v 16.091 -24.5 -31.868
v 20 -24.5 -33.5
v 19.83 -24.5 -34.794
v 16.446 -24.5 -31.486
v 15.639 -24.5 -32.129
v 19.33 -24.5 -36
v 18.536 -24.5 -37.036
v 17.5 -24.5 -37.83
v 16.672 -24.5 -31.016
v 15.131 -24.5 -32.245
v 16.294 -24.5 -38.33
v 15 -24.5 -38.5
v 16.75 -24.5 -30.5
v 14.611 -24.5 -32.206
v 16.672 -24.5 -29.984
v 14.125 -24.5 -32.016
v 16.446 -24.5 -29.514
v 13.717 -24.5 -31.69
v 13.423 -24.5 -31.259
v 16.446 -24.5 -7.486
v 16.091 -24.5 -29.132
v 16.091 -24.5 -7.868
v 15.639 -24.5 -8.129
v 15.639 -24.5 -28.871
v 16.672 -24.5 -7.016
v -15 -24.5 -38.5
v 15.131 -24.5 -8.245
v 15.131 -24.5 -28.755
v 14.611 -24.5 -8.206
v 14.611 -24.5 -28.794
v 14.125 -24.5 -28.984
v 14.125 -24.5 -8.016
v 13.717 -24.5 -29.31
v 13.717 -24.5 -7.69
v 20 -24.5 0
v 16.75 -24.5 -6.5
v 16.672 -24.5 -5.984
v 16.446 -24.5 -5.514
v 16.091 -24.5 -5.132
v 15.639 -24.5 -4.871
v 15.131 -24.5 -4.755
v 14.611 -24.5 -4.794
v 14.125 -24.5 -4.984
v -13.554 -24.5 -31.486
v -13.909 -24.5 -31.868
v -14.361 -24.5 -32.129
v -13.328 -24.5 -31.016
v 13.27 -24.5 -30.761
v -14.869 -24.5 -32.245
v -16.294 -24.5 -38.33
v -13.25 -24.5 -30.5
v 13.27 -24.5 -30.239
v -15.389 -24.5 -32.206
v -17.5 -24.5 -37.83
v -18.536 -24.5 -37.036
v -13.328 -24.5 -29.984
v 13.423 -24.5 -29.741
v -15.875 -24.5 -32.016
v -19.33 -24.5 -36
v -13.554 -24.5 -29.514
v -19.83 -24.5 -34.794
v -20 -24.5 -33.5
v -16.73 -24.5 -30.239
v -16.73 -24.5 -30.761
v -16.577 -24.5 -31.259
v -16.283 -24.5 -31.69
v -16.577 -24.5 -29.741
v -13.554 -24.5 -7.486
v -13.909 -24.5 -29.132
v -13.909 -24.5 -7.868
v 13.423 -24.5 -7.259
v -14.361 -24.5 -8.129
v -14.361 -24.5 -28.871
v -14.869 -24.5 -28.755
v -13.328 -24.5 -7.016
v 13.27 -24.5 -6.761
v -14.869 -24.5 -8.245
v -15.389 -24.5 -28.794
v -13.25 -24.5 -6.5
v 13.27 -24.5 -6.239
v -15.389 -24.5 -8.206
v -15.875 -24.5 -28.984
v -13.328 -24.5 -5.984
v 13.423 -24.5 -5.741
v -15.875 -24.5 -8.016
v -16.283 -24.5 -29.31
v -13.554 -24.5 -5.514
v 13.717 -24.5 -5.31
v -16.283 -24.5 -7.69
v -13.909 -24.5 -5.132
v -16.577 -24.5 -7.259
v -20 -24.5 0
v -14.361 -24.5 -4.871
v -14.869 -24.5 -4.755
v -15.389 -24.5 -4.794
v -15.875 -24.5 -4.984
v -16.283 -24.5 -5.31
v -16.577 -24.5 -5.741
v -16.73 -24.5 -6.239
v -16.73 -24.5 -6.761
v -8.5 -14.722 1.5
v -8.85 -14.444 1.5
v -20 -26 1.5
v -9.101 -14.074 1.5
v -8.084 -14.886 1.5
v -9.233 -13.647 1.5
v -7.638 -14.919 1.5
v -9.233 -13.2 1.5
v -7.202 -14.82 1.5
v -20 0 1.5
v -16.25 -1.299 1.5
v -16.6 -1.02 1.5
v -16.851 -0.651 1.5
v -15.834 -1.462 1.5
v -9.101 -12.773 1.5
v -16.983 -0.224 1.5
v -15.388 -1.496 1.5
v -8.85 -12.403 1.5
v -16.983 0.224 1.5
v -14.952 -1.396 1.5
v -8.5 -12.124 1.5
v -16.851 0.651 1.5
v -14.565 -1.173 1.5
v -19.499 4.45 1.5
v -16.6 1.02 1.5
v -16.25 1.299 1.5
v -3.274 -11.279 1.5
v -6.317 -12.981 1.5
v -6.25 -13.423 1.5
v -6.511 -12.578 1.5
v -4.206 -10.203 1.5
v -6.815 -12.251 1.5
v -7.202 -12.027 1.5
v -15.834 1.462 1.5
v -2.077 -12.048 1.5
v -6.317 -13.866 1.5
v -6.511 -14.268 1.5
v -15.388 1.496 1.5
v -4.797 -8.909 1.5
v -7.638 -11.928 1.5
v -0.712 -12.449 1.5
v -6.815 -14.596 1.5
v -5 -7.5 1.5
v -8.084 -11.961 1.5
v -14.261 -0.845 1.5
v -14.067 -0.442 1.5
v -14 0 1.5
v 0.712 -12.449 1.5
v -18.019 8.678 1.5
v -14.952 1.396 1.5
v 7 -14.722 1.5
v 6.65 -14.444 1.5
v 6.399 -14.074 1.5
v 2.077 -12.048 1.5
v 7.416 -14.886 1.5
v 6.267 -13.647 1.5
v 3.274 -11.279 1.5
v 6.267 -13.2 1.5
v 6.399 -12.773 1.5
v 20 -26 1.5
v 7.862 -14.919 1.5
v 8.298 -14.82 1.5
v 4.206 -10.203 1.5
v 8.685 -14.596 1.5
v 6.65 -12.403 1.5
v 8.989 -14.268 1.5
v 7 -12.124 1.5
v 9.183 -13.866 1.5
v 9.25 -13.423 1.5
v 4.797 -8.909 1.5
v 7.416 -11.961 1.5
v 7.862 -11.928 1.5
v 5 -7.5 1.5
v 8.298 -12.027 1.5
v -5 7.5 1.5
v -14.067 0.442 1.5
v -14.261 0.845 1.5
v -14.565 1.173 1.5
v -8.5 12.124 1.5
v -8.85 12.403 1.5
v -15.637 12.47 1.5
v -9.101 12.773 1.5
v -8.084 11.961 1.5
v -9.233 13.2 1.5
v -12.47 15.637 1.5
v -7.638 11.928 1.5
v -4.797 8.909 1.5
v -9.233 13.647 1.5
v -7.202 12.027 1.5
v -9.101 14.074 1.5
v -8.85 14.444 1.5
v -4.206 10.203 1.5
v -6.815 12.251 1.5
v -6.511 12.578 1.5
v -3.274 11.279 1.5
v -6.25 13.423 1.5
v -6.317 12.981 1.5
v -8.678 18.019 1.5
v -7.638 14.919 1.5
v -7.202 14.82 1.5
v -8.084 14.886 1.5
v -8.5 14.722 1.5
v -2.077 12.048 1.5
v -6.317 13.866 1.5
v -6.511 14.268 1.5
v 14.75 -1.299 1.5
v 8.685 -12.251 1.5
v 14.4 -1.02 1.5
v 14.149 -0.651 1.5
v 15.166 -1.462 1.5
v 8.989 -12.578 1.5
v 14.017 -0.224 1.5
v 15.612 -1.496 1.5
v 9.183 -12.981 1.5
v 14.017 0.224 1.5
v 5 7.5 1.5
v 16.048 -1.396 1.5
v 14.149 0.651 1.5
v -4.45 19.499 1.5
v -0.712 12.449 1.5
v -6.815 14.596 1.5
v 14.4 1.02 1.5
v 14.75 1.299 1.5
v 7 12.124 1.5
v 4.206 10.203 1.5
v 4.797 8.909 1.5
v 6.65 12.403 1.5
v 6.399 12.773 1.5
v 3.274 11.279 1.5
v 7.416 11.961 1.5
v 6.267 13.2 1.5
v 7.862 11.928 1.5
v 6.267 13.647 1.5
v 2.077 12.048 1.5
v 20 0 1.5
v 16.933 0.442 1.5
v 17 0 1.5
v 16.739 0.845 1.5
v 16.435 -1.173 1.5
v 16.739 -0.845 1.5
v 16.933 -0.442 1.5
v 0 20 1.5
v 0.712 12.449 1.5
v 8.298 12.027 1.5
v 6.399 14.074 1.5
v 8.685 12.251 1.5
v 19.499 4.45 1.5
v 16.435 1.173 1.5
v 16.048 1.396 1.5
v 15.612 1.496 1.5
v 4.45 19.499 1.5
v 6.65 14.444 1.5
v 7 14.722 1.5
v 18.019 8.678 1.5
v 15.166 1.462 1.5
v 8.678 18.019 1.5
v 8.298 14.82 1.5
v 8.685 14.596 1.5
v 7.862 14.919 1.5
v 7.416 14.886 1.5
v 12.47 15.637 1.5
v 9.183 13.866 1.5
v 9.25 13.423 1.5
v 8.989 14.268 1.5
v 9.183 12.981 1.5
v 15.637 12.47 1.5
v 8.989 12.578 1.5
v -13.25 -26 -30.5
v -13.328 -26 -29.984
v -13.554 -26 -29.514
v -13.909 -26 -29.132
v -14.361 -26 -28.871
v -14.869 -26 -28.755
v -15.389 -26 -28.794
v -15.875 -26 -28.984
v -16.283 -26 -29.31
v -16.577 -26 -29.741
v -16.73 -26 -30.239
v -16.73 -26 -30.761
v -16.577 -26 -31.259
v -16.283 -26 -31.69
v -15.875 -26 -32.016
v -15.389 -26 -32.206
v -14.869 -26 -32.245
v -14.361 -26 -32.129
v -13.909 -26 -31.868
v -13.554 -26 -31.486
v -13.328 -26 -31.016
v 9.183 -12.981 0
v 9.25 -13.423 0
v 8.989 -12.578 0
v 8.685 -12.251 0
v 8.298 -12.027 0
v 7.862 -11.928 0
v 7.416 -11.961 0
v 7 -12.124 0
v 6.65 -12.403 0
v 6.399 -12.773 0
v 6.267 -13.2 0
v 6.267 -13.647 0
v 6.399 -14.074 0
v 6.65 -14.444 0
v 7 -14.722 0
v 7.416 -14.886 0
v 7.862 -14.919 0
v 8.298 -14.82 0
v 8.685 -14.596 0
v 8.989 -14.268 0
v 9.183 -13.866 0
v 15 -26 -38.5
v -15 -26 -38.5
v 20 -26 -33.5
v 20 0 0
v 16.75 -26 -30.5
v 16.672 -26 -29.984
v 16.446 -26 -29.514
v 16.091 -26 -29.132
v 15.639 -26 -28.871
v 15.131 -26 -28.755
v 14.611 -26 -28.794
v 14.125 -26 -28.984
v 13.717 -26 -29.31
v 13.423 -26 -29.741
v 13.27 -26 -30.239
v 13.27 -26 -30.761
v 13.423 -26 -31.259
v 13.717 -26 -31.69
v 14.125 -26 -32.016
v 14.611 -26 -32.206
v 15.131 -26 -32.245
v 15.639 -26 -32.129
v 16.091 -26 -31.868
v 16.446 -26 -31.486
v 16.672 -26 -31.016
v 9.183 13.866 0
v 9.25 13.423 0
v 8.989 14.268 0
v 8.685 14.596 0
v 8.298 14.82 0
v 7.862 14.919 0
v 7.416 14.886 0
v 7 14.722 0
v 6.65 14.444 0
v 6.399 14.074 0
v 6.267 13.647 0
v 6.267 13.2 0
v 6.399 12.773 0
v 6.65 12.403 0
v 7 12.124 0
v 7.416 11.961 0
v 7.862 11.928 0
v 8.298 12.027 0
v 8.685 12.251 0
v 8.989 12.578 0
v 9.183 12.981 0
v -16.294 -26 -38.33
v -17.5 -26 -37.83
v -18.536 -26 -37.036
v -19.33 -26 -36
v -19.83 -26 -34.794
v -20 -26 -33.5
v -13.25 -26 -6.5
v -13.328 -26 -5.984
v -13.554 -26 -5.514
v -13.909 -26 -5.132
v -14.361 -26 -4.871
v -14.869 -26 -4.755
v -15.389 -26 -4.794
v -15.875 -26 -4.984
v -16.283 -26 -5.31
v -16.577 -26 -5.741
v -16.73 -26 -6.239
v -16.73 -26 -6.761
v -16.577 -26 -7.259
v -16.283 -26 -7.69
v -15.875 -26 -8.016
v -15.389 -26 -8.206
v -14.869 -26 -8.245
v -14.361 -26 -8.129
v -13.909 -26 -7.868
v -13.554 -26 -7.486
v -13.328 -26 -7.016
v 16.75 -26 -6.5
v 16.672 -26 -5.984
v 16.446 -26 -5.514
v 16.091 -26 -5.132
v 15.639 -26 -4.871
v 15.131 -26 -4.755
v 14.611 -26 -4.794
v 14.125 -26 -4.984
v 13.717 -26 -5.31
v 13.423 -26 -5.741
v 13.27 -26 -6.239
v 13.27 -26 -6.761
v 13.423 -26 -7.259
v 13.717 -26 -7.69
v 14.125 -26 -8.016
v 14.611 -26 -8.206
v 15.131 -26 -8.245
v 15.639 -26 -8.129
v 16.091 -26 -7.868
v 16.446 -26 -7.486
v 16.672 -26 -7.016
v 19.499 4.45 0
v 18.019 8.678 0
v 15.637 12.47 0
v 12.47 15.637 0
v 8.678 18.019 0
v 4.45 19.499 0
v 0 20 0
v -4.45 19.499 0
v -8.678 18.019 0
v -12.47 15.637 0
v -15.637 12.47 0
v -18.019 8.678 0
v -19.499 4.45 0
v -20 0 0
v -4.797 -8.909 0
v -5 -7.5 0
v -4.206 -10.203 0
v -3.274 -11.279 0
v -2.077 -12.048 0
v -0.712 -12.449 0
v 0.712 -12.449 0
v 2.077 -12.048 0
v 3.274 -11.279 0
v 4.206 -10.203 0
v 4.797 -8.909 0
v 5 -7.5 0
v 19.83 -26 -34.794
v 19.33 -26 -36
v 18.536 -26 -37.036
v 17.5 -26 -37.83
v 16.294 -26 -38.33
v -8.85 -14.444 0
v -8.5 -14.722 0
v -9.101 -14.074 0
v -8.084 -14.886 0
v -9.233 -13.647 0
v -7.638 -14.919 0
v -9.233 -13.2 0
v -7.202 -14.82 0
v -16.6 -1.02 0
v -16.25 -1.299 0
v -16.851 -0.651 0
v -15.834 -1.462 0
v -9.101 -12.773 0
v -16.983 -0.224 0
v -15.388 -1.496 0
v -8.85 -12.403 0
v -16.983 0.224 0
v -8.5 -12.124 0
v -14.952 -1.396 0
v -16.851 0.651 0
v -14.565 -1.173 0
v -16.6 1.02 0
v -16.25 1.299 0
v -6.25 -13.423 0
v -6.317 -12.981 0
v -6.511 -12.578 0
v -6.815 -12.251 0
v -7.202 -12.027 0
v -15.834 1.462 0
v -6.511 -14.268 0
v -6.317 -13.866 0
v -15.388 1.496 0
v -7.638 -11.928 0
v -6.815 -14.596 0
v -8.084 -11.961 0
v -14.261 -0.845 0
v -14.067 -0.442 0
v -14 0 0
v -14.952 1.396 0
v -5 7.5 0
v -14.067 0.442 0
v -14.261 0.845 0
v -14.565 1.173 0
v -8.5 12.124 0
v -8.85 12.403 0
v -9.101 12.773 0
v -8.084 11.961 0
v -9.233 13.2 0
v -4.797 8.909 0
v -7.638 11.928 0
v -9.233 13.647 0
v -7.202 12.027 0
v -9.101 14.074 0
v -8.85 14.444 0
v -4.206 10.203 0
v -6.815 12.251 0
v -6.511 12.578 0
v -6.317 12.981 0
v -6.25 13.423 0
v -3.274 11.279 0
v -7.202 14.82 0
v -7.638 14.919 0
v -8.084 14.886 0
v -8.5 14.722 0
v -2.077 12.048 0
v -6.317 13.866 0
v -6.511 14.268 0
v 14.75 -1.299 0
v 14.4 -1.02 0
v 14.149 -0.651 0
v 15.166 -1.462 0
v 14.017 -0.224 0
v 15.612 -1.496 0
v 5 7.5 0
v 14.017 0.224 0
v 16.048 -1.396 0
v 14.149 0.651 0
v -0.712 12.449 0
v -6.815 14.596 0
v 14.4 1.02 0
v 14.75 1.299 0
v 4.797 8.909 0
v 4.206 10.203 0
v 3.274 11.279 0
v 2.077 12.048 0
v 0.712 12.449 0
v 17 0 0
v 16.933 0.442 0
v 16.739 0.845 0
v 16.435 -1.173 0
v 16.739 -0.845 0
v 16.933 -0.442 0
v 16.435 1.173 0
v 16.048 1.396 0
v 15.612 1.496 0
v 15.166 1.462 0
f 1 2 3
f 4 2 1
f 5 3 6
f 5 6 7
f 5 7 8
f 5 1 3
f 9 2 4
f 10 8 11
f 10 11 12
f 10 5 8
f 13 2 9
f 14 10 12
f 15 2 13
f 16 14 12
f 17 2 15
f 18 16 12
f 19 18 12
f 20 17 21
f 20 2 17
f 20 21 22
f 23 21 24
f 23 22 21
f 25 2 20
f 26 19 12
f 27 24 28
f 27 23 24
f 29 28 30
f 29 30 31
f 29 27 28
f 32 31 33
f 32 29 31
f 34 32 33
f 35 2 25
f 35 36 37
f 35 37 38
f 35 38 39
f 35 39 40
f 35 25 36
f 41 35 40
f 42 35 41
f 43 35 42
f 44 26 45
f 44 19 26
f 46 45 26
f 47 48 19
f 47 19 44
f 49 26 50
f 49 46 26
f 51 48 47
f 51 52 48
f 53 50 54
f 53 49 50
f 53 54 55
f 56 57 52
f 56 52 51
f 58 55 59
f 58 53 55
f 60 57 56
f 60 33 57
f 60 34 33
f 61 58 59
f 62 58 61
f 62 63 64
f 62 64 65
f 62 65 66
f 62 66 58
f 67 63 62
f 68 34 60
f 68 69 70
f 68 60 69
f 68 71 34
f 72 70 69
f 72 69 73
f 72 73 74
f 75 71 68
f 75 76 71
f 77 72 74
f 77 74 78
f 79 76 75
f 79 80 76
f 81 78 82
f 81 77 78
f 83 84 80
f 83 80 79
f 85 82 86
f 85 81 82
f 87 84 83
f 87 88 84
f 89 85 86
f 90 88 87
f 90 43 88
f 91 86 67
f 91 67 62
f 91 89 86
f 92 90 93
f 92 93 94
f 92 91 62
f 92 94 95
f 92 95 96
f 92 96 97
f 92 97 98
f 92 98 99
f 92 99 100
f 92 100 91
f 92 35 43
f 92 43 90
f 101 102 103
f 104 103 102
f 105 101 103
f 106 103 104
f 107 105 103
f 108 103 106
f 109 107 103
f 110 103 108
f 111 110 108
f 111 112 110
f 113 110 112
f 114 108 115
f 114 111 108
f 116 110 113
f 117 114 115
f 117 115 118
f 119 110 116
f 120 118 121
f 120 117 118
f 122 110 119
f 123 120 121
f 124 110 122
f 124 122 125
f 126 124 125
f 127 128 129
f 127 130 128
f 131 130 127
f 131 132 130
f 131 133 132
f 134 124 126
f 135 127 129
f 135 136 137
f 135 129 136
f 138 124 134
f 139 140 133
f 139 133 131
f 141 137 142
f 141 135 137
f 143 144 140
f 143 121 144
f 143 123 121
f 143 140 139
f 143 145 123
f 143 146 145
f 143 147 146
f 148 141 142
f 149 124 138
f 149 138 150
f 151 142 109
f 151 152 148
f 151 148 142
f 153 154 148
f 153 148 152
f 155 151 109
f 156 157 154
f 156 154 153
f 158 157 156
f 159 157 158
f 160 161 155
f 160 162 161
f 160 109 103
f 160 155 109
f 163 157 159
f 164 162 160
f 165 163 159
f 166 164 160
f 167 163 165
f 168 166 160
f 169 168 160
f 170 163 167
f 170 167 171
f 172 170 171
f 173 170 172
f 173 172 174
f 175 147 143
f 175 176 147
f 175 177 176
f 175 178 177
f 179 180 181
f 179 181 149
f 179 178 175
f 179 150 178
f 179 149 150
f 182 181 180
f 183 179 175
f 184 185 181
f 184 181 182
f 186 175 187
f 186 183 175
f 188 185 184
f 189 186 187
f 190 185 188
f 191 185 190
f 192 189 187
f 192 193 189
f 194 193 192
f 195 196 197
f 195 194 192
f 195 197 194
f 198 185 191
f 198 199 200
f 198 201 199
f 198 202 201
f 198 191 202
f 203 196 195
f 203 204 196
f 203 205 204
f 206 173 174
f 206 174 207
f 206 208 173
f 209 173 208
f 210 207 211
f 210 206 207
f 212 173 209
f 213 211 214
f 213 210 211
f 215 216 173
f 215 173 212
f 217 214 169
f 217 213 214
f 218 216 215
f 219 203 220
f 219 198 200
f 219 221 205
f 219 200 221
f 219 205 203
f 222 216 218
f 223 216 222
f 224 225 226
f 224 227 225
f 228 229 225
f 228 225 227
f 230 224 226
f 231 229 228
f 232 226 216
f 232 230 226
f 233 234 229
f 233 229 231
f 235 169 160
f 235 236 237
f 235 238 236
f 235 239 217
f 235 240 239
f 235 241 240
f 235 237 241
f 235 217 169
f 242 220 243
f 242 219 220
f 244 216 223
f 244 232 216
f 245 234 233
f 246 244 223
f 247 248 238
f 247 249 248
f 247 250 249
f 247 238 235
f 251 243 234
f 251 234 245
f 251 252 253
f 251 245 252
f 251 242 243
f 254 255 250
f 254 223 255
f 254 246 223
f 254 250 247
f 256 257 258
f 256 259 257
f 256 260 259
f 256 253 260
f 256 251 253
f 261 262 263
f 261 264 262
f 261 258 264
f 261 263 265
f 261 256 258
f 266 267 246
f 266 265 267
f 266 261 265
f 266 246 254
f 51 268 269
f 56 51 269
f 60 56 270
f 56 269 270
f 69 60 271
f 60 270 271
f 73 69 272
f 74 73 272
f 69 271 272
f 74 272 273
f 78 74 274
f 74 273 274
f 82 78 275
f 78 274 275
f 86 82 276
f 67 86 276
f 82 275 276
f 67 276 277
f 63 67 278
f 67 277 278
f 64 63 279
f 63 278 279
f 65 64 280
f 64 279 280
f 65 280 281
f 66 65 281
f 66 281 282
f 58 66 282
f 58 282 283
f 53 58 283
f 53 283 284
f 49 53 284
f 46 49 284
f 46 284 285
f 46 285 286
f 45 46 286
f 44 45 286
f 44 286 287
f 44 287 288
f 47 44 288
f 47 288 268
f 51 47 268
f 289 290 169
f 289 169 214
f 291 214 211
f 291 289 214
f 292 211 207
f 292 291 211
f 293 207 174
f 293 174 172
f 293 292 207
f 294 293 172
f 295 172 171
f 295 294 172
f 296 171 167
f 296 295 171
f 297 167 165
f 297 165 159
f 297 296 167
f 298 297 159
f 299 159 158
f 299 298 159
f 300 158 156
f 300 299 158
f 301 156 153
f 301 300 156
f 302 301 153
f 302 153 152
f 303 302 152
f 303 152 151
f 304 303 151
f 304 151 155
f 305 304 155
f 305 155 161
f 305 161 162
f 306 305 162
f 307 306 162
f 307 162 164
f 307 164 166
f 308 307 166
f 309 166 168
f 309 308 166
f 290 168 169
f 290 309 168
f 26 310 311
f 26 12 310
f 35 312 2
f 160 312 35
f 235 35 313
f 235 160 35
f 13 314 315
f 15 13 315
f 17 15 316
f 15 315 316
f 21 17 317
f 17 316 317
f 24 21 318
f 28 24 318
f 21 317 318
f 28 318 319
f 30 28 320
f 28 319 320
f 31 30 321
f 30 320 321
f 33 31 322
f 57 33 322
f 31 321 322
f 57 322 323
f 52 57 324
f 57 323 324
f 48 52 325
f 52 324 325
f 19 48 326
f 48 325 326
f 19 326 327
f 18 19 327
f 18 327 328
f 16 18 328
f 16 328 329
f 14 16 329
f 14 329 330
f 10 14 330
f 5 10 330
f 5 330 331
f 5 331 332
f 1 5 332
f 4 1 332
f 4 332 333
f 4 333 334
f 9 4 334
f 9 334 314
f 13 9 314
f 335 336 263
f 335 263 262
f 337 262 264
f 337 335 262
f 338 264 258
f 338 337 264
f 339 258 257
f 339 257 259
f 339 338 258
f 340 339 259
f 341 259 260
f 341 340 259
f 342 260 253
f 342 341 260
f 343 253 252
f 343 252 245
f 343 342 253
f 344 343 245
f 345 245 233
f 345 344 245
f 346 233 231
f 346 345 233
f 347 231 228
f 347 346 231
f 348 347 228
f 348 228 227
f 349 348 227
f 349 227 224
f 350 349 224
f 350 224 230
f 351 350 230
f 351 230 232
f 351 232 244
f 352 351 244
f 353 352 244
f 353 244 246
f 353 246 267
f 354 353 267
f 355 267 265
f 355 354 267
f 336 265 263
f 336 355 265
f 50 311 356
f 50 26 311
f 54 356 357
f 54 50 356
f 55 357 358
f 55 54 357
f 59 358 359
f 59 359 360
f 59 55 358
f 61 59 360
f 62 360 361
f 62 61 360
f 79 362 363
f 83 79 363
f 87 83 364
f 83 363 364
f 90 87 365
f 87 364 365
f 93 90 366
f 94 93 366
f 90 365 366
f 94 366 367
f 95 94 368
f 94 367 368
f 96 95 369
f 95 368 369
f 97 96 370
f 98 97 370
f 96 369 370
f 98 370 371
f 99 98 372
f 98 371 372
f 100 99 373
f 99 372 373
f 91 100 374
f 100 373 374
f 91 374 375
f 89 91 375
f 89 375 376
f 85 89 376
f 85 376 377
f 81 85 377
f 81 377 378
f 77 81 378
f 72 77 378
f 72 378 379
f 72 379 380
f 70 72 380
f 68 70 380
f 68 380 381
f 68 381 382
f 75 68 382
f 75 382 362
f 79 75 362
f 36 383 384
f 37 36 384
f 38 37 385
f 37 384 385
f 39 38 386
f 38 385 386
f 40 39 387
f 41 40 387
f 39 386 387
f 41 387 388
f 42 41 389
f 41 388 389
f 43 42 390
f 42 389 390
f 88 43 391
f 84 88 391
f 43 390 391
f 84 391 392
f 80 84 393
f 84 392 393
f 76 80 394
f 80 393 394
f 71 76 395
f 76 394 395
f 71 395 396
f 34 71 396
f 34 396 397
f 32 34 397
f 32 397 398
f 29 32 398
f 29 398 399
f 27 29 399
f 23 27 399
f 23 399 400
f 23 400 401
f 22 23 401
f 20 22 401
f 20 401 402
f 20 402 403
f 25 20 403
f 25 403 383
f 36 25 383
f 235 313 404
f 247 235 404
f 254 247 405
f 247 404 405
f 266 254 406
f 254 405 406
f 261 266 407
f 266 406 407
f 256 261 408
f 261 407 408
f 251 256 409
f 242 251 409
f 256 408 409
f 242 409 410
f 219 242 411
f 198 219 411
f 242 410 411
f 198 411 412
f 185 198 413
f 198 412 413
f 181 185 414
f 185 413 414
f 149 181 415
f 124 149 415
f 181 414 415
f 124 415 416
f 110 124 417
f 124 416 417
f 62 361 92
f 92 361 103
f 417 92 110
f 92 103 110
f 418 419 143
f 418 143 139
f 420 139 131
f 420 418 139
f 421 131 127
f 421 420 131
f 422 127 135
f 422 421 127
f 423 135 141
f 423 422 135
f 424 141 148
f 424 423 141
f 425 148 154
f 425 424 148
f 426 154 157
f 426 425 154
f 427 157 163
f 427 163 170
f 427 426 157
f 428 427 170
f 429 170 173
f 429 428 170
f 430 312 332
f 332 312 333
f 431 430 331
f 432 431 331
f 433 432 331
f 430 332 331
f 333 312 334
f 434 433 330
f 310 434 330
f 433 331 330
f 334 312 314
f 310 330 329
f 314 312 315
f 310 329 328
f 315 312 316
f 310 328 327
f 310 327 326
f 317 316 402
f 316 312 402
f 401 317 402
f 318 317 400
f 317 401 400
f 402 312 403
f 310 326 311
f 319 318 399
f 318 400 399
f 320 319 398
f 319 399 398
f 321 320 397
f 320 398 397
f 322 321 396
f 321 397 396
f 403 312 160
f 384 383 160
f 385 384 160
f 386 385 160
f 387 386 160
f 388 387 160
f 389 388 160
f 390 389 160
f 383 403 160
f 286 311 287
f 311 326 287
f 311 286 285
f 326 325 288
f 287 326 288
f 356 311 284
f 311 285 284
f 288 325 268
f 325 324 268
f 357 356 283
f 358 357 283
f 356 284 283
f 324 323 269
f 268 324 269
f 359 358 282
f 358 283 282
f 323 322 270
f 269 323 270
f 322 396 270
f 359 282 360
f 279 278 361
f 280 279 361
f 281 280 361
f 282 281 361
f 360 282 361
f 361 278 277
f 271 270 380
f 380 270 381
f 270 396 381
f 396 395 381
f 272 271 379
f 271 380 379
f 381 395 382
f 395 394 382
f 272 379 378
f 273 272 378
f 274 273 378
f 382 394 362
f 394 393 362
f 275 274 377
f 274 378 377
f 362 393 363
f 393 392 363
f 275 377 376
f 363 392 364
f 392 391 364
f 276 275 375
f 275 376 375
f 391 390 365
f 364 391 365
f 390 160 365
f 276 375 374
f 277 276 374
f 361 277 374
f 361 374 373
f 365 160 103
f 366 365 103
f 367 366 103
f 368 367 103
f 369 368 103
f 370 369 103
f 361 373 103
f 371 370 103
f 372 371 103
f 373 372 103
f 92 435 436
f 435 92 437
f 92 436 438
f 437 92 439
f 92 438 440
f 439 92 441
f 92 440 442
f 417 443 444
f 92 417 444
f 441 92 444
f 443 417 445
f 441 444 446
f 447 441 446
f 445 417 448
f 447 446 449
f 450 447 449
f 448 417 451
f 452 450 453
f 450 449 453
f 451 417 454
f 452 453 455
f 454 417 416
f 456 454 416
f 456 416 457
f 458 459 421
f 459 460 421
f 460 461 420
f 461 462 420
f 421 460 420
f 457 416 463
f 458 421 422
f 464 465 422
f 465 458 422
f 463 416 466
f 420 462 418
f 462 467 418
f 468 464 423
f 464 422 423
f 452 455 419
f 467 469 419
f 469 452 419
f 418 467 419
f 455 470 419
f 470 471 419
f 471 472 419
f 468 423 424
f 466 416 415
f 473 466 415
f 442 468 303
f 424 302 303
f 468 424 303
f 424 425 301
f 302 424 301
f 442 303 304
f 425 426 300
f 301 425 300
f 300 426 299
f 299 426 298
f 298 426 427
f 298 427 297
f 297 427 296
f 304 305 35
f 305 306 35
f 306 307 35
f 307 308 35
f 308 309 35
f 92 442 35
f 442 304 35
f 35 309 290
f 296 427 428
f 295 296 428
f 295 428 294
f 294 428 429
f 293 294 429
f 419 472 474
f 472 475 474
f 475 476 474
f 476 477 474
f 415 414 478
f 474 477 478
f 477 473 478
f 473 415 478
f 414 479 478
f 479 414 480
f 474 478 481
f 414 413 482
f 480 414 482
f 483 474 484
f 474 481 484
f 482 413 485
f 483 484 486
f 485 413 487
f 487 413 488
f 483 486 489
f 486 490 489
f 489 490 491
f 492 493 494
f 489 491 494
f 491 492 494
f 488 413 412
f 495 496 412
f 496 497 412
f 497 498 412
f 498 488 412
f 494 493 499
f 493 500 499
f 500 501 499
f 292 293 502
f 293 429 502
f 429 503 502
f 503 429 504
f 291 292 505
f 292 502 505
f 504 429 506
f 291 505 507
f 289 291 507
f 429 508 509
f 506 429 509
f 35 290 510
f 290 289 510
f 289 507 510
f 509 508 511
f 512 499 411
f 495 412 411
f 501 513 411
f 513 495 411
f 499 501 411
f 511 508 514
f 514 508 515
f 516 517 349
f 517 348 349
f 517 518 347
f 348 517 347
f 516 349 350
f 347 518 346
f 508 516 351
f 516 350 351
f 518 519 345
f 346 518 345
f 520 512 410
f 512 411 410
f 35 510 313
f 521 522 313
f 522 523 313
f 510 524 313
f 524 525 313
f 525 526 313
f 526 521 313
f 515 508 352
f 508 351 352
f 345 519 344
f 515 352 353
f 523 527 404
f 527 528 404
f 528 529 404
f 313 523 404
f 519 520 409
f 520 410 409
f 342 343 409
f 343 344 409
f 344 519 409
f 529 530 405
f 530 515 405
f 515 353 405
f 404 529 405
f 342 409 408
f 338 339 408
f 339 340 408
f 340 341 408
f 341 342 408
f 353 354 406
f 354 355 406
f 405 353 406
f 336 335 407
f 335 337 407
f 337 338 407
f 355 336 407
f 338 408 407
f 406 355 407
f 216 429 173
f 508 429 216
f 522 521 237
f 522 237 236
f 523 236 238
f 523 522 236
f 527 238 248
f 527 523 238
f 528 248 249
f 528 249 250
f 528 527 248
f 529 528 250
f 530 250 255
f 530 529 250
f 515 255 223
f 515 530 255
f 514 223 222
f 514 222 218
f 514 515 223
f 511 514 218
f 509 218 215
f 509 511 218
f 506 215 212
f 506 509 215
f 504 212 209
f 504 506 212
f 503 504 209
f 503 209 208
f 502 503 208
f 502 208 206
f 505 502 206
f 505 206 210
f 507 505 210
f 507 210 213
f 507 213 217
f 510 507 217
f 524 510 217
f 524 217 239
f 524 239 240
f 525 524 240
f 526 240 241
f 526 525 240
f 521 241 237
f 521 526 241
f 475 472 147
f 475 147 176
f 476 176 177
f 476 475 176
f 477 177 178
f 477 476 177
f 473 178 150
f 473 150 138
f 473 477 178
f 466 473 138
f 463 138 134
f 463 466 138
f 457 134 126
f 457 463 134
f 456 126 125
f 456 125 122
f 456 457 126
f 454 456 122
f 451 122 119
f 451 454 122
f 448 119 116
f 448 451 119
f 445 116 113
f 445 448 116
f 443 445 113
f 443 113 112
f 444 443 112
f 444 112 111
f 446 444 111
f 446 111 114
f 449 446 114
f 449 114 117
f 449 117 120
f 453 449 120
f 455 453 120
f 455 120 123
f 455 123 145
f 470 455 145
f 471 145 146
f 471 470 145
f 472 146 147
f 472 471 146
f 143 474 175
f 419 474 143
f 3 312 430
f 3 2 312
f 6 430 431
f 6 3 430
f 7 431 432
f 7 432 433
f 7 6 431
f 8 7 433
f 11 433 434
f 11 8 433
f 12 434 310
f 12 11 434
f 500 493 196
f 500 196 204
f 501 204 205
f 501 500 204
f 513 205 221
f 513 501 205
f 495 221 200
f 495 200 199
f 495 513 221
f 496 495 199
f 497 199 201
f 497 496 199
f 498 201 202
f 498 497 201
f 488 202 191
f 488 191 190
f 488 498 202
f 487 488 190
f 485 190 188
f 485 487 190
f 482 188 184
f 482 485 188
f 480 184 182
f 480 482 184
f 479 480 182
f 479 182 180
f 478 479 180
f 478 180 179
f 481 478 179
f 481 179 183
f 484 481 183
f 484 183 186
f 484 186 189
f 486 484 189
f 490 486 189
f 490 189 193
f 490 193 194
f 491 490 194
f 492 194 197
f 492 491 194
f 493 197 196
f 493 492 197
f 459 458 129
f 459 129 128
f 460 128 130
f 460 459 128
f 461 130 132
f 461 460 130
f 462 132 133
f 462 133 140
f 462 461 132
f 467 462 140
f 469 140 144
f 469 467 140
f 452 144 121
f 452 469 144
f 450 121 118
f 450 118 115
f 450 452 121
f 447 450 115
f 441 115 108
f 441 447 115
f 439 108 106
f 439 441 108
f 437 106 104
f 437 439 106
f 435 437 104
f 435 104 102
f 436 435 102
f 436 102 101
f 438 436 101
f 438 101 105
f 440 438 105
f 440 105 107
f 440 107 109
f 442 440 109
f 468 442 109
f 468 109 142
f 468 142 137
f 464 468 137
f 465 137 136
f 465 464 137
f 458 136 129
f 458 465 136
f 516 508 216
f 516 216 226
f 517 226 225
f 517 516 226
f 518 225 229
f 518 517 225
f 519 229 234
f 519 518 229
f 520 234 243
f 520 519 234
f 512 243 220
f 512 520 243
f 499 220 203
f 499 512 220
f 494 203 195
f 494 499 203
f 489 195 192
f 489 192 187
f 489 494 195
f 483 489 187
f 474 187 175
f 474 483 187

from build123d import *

# Parameters (mm, degrees)
SKETCH_1_R          = 1.5
EXTRUDE_1_DEPTH     = 1.5
SKETCH_2_W          = 40
SKETCH_2_H          = 1.5
EXTRUDE_2_DEPTH     = 38.5
SKETCH_3_R          = 1.75
CUT_EXTRUDE_1_DEPTH = 47
FILLET_1_R          = 5


with BuildPart() as part:
    # 草图1 → 凸台-拉伸1 (new body)
    with BuildSketch(Plane.XY):
        with BuildLine():
            Line((-20, 0), (-20, -26))
            Line((-20, -26), (20, -26))
            Line((20, -26), (20, 0))
            ThreePointArc((20, 0), (0, 20), (-20, 0))
        make_face()
        with Locations((7.75, 13.423393759)):
            Circle(SKETCH_1_R, mode=Mode.SUBTRACT)
        with Locations((-7.75, 13.423393759)):
            Circle(SKETCH_1_R, mode=Mode.SUBTRACT)
        with Locations((-15.5, 0)):
            Circle(SKETCH_1_R, mode=Mode.SUBTRACT)
        with Locations((-7.75, -13.423393759)):
            Circle(SKETCH_1_R, mode=Mode.SUBTRACT)
        with Locations((7.75, -13.423393759)):
            Circle(SKETCH_1_R, mode=Mode.SUBTRACT)
        with Locations((15.5, 0)):
            Circle(SKETCH_1_R, mode=Mode.SUBTRACT)
        with BuildLine():
            Line((5, -7.5), (5, 7.5))
            ThreePointArc((5, 7.5), (0, 12.5), (-5, 7.5))
            Line((-5, 7.5), (-5, -7.5))
            ThreePointArc((-5, -7.5), (0, -12.5), (5, -7.5))
        make_face(mode=Mode.SUBTRACT)
    extrude(amount=EXTRUDE_1_DEPTH)

    # 草图2 → 凸台-拉伸2 (add)
    with BuildSketch(Plane(origin=(0, 0, 0), x_dir=(-1, 0, 0), z_dir=(0, 0, -1))):
        with Locations((0, -25.25)):
            Rectangle(SKETCH_2_W, SKETCH_2_H)
    extrude(amount=EXTRUDE_2_DEPTH)

    # 草图3 → 切除-拉伸1 (cut, through all)
    with BuildSketch(Plane.XZ.offset(26)):
        with Locations((-15, -6.5)):
            Circle(SKETCH_3_R)
        with Locations((15, -6.5)):
            Circle(SKETCH_3_R)
        with Locations((-15, -30.5)):
            Circle(SKETCH_3_R)
        with Locations((15, -30.5)):
            Circle(SKETCH_3_R)
    extrude(amount=-CUT_EXTRUDE_1_DEPTH, mode=Mode.SUBTRACT)

    # 圆角1
    fillet_1_edges = [part.edges().sort_by_distance(p)[0] for p in [
        (20, -25.25, -38.5),
        (-20, -25.25, -38.5),
    ]]
    fillet(fillet_1_edges, radius=FILLET_1_R)


solid = part.part
